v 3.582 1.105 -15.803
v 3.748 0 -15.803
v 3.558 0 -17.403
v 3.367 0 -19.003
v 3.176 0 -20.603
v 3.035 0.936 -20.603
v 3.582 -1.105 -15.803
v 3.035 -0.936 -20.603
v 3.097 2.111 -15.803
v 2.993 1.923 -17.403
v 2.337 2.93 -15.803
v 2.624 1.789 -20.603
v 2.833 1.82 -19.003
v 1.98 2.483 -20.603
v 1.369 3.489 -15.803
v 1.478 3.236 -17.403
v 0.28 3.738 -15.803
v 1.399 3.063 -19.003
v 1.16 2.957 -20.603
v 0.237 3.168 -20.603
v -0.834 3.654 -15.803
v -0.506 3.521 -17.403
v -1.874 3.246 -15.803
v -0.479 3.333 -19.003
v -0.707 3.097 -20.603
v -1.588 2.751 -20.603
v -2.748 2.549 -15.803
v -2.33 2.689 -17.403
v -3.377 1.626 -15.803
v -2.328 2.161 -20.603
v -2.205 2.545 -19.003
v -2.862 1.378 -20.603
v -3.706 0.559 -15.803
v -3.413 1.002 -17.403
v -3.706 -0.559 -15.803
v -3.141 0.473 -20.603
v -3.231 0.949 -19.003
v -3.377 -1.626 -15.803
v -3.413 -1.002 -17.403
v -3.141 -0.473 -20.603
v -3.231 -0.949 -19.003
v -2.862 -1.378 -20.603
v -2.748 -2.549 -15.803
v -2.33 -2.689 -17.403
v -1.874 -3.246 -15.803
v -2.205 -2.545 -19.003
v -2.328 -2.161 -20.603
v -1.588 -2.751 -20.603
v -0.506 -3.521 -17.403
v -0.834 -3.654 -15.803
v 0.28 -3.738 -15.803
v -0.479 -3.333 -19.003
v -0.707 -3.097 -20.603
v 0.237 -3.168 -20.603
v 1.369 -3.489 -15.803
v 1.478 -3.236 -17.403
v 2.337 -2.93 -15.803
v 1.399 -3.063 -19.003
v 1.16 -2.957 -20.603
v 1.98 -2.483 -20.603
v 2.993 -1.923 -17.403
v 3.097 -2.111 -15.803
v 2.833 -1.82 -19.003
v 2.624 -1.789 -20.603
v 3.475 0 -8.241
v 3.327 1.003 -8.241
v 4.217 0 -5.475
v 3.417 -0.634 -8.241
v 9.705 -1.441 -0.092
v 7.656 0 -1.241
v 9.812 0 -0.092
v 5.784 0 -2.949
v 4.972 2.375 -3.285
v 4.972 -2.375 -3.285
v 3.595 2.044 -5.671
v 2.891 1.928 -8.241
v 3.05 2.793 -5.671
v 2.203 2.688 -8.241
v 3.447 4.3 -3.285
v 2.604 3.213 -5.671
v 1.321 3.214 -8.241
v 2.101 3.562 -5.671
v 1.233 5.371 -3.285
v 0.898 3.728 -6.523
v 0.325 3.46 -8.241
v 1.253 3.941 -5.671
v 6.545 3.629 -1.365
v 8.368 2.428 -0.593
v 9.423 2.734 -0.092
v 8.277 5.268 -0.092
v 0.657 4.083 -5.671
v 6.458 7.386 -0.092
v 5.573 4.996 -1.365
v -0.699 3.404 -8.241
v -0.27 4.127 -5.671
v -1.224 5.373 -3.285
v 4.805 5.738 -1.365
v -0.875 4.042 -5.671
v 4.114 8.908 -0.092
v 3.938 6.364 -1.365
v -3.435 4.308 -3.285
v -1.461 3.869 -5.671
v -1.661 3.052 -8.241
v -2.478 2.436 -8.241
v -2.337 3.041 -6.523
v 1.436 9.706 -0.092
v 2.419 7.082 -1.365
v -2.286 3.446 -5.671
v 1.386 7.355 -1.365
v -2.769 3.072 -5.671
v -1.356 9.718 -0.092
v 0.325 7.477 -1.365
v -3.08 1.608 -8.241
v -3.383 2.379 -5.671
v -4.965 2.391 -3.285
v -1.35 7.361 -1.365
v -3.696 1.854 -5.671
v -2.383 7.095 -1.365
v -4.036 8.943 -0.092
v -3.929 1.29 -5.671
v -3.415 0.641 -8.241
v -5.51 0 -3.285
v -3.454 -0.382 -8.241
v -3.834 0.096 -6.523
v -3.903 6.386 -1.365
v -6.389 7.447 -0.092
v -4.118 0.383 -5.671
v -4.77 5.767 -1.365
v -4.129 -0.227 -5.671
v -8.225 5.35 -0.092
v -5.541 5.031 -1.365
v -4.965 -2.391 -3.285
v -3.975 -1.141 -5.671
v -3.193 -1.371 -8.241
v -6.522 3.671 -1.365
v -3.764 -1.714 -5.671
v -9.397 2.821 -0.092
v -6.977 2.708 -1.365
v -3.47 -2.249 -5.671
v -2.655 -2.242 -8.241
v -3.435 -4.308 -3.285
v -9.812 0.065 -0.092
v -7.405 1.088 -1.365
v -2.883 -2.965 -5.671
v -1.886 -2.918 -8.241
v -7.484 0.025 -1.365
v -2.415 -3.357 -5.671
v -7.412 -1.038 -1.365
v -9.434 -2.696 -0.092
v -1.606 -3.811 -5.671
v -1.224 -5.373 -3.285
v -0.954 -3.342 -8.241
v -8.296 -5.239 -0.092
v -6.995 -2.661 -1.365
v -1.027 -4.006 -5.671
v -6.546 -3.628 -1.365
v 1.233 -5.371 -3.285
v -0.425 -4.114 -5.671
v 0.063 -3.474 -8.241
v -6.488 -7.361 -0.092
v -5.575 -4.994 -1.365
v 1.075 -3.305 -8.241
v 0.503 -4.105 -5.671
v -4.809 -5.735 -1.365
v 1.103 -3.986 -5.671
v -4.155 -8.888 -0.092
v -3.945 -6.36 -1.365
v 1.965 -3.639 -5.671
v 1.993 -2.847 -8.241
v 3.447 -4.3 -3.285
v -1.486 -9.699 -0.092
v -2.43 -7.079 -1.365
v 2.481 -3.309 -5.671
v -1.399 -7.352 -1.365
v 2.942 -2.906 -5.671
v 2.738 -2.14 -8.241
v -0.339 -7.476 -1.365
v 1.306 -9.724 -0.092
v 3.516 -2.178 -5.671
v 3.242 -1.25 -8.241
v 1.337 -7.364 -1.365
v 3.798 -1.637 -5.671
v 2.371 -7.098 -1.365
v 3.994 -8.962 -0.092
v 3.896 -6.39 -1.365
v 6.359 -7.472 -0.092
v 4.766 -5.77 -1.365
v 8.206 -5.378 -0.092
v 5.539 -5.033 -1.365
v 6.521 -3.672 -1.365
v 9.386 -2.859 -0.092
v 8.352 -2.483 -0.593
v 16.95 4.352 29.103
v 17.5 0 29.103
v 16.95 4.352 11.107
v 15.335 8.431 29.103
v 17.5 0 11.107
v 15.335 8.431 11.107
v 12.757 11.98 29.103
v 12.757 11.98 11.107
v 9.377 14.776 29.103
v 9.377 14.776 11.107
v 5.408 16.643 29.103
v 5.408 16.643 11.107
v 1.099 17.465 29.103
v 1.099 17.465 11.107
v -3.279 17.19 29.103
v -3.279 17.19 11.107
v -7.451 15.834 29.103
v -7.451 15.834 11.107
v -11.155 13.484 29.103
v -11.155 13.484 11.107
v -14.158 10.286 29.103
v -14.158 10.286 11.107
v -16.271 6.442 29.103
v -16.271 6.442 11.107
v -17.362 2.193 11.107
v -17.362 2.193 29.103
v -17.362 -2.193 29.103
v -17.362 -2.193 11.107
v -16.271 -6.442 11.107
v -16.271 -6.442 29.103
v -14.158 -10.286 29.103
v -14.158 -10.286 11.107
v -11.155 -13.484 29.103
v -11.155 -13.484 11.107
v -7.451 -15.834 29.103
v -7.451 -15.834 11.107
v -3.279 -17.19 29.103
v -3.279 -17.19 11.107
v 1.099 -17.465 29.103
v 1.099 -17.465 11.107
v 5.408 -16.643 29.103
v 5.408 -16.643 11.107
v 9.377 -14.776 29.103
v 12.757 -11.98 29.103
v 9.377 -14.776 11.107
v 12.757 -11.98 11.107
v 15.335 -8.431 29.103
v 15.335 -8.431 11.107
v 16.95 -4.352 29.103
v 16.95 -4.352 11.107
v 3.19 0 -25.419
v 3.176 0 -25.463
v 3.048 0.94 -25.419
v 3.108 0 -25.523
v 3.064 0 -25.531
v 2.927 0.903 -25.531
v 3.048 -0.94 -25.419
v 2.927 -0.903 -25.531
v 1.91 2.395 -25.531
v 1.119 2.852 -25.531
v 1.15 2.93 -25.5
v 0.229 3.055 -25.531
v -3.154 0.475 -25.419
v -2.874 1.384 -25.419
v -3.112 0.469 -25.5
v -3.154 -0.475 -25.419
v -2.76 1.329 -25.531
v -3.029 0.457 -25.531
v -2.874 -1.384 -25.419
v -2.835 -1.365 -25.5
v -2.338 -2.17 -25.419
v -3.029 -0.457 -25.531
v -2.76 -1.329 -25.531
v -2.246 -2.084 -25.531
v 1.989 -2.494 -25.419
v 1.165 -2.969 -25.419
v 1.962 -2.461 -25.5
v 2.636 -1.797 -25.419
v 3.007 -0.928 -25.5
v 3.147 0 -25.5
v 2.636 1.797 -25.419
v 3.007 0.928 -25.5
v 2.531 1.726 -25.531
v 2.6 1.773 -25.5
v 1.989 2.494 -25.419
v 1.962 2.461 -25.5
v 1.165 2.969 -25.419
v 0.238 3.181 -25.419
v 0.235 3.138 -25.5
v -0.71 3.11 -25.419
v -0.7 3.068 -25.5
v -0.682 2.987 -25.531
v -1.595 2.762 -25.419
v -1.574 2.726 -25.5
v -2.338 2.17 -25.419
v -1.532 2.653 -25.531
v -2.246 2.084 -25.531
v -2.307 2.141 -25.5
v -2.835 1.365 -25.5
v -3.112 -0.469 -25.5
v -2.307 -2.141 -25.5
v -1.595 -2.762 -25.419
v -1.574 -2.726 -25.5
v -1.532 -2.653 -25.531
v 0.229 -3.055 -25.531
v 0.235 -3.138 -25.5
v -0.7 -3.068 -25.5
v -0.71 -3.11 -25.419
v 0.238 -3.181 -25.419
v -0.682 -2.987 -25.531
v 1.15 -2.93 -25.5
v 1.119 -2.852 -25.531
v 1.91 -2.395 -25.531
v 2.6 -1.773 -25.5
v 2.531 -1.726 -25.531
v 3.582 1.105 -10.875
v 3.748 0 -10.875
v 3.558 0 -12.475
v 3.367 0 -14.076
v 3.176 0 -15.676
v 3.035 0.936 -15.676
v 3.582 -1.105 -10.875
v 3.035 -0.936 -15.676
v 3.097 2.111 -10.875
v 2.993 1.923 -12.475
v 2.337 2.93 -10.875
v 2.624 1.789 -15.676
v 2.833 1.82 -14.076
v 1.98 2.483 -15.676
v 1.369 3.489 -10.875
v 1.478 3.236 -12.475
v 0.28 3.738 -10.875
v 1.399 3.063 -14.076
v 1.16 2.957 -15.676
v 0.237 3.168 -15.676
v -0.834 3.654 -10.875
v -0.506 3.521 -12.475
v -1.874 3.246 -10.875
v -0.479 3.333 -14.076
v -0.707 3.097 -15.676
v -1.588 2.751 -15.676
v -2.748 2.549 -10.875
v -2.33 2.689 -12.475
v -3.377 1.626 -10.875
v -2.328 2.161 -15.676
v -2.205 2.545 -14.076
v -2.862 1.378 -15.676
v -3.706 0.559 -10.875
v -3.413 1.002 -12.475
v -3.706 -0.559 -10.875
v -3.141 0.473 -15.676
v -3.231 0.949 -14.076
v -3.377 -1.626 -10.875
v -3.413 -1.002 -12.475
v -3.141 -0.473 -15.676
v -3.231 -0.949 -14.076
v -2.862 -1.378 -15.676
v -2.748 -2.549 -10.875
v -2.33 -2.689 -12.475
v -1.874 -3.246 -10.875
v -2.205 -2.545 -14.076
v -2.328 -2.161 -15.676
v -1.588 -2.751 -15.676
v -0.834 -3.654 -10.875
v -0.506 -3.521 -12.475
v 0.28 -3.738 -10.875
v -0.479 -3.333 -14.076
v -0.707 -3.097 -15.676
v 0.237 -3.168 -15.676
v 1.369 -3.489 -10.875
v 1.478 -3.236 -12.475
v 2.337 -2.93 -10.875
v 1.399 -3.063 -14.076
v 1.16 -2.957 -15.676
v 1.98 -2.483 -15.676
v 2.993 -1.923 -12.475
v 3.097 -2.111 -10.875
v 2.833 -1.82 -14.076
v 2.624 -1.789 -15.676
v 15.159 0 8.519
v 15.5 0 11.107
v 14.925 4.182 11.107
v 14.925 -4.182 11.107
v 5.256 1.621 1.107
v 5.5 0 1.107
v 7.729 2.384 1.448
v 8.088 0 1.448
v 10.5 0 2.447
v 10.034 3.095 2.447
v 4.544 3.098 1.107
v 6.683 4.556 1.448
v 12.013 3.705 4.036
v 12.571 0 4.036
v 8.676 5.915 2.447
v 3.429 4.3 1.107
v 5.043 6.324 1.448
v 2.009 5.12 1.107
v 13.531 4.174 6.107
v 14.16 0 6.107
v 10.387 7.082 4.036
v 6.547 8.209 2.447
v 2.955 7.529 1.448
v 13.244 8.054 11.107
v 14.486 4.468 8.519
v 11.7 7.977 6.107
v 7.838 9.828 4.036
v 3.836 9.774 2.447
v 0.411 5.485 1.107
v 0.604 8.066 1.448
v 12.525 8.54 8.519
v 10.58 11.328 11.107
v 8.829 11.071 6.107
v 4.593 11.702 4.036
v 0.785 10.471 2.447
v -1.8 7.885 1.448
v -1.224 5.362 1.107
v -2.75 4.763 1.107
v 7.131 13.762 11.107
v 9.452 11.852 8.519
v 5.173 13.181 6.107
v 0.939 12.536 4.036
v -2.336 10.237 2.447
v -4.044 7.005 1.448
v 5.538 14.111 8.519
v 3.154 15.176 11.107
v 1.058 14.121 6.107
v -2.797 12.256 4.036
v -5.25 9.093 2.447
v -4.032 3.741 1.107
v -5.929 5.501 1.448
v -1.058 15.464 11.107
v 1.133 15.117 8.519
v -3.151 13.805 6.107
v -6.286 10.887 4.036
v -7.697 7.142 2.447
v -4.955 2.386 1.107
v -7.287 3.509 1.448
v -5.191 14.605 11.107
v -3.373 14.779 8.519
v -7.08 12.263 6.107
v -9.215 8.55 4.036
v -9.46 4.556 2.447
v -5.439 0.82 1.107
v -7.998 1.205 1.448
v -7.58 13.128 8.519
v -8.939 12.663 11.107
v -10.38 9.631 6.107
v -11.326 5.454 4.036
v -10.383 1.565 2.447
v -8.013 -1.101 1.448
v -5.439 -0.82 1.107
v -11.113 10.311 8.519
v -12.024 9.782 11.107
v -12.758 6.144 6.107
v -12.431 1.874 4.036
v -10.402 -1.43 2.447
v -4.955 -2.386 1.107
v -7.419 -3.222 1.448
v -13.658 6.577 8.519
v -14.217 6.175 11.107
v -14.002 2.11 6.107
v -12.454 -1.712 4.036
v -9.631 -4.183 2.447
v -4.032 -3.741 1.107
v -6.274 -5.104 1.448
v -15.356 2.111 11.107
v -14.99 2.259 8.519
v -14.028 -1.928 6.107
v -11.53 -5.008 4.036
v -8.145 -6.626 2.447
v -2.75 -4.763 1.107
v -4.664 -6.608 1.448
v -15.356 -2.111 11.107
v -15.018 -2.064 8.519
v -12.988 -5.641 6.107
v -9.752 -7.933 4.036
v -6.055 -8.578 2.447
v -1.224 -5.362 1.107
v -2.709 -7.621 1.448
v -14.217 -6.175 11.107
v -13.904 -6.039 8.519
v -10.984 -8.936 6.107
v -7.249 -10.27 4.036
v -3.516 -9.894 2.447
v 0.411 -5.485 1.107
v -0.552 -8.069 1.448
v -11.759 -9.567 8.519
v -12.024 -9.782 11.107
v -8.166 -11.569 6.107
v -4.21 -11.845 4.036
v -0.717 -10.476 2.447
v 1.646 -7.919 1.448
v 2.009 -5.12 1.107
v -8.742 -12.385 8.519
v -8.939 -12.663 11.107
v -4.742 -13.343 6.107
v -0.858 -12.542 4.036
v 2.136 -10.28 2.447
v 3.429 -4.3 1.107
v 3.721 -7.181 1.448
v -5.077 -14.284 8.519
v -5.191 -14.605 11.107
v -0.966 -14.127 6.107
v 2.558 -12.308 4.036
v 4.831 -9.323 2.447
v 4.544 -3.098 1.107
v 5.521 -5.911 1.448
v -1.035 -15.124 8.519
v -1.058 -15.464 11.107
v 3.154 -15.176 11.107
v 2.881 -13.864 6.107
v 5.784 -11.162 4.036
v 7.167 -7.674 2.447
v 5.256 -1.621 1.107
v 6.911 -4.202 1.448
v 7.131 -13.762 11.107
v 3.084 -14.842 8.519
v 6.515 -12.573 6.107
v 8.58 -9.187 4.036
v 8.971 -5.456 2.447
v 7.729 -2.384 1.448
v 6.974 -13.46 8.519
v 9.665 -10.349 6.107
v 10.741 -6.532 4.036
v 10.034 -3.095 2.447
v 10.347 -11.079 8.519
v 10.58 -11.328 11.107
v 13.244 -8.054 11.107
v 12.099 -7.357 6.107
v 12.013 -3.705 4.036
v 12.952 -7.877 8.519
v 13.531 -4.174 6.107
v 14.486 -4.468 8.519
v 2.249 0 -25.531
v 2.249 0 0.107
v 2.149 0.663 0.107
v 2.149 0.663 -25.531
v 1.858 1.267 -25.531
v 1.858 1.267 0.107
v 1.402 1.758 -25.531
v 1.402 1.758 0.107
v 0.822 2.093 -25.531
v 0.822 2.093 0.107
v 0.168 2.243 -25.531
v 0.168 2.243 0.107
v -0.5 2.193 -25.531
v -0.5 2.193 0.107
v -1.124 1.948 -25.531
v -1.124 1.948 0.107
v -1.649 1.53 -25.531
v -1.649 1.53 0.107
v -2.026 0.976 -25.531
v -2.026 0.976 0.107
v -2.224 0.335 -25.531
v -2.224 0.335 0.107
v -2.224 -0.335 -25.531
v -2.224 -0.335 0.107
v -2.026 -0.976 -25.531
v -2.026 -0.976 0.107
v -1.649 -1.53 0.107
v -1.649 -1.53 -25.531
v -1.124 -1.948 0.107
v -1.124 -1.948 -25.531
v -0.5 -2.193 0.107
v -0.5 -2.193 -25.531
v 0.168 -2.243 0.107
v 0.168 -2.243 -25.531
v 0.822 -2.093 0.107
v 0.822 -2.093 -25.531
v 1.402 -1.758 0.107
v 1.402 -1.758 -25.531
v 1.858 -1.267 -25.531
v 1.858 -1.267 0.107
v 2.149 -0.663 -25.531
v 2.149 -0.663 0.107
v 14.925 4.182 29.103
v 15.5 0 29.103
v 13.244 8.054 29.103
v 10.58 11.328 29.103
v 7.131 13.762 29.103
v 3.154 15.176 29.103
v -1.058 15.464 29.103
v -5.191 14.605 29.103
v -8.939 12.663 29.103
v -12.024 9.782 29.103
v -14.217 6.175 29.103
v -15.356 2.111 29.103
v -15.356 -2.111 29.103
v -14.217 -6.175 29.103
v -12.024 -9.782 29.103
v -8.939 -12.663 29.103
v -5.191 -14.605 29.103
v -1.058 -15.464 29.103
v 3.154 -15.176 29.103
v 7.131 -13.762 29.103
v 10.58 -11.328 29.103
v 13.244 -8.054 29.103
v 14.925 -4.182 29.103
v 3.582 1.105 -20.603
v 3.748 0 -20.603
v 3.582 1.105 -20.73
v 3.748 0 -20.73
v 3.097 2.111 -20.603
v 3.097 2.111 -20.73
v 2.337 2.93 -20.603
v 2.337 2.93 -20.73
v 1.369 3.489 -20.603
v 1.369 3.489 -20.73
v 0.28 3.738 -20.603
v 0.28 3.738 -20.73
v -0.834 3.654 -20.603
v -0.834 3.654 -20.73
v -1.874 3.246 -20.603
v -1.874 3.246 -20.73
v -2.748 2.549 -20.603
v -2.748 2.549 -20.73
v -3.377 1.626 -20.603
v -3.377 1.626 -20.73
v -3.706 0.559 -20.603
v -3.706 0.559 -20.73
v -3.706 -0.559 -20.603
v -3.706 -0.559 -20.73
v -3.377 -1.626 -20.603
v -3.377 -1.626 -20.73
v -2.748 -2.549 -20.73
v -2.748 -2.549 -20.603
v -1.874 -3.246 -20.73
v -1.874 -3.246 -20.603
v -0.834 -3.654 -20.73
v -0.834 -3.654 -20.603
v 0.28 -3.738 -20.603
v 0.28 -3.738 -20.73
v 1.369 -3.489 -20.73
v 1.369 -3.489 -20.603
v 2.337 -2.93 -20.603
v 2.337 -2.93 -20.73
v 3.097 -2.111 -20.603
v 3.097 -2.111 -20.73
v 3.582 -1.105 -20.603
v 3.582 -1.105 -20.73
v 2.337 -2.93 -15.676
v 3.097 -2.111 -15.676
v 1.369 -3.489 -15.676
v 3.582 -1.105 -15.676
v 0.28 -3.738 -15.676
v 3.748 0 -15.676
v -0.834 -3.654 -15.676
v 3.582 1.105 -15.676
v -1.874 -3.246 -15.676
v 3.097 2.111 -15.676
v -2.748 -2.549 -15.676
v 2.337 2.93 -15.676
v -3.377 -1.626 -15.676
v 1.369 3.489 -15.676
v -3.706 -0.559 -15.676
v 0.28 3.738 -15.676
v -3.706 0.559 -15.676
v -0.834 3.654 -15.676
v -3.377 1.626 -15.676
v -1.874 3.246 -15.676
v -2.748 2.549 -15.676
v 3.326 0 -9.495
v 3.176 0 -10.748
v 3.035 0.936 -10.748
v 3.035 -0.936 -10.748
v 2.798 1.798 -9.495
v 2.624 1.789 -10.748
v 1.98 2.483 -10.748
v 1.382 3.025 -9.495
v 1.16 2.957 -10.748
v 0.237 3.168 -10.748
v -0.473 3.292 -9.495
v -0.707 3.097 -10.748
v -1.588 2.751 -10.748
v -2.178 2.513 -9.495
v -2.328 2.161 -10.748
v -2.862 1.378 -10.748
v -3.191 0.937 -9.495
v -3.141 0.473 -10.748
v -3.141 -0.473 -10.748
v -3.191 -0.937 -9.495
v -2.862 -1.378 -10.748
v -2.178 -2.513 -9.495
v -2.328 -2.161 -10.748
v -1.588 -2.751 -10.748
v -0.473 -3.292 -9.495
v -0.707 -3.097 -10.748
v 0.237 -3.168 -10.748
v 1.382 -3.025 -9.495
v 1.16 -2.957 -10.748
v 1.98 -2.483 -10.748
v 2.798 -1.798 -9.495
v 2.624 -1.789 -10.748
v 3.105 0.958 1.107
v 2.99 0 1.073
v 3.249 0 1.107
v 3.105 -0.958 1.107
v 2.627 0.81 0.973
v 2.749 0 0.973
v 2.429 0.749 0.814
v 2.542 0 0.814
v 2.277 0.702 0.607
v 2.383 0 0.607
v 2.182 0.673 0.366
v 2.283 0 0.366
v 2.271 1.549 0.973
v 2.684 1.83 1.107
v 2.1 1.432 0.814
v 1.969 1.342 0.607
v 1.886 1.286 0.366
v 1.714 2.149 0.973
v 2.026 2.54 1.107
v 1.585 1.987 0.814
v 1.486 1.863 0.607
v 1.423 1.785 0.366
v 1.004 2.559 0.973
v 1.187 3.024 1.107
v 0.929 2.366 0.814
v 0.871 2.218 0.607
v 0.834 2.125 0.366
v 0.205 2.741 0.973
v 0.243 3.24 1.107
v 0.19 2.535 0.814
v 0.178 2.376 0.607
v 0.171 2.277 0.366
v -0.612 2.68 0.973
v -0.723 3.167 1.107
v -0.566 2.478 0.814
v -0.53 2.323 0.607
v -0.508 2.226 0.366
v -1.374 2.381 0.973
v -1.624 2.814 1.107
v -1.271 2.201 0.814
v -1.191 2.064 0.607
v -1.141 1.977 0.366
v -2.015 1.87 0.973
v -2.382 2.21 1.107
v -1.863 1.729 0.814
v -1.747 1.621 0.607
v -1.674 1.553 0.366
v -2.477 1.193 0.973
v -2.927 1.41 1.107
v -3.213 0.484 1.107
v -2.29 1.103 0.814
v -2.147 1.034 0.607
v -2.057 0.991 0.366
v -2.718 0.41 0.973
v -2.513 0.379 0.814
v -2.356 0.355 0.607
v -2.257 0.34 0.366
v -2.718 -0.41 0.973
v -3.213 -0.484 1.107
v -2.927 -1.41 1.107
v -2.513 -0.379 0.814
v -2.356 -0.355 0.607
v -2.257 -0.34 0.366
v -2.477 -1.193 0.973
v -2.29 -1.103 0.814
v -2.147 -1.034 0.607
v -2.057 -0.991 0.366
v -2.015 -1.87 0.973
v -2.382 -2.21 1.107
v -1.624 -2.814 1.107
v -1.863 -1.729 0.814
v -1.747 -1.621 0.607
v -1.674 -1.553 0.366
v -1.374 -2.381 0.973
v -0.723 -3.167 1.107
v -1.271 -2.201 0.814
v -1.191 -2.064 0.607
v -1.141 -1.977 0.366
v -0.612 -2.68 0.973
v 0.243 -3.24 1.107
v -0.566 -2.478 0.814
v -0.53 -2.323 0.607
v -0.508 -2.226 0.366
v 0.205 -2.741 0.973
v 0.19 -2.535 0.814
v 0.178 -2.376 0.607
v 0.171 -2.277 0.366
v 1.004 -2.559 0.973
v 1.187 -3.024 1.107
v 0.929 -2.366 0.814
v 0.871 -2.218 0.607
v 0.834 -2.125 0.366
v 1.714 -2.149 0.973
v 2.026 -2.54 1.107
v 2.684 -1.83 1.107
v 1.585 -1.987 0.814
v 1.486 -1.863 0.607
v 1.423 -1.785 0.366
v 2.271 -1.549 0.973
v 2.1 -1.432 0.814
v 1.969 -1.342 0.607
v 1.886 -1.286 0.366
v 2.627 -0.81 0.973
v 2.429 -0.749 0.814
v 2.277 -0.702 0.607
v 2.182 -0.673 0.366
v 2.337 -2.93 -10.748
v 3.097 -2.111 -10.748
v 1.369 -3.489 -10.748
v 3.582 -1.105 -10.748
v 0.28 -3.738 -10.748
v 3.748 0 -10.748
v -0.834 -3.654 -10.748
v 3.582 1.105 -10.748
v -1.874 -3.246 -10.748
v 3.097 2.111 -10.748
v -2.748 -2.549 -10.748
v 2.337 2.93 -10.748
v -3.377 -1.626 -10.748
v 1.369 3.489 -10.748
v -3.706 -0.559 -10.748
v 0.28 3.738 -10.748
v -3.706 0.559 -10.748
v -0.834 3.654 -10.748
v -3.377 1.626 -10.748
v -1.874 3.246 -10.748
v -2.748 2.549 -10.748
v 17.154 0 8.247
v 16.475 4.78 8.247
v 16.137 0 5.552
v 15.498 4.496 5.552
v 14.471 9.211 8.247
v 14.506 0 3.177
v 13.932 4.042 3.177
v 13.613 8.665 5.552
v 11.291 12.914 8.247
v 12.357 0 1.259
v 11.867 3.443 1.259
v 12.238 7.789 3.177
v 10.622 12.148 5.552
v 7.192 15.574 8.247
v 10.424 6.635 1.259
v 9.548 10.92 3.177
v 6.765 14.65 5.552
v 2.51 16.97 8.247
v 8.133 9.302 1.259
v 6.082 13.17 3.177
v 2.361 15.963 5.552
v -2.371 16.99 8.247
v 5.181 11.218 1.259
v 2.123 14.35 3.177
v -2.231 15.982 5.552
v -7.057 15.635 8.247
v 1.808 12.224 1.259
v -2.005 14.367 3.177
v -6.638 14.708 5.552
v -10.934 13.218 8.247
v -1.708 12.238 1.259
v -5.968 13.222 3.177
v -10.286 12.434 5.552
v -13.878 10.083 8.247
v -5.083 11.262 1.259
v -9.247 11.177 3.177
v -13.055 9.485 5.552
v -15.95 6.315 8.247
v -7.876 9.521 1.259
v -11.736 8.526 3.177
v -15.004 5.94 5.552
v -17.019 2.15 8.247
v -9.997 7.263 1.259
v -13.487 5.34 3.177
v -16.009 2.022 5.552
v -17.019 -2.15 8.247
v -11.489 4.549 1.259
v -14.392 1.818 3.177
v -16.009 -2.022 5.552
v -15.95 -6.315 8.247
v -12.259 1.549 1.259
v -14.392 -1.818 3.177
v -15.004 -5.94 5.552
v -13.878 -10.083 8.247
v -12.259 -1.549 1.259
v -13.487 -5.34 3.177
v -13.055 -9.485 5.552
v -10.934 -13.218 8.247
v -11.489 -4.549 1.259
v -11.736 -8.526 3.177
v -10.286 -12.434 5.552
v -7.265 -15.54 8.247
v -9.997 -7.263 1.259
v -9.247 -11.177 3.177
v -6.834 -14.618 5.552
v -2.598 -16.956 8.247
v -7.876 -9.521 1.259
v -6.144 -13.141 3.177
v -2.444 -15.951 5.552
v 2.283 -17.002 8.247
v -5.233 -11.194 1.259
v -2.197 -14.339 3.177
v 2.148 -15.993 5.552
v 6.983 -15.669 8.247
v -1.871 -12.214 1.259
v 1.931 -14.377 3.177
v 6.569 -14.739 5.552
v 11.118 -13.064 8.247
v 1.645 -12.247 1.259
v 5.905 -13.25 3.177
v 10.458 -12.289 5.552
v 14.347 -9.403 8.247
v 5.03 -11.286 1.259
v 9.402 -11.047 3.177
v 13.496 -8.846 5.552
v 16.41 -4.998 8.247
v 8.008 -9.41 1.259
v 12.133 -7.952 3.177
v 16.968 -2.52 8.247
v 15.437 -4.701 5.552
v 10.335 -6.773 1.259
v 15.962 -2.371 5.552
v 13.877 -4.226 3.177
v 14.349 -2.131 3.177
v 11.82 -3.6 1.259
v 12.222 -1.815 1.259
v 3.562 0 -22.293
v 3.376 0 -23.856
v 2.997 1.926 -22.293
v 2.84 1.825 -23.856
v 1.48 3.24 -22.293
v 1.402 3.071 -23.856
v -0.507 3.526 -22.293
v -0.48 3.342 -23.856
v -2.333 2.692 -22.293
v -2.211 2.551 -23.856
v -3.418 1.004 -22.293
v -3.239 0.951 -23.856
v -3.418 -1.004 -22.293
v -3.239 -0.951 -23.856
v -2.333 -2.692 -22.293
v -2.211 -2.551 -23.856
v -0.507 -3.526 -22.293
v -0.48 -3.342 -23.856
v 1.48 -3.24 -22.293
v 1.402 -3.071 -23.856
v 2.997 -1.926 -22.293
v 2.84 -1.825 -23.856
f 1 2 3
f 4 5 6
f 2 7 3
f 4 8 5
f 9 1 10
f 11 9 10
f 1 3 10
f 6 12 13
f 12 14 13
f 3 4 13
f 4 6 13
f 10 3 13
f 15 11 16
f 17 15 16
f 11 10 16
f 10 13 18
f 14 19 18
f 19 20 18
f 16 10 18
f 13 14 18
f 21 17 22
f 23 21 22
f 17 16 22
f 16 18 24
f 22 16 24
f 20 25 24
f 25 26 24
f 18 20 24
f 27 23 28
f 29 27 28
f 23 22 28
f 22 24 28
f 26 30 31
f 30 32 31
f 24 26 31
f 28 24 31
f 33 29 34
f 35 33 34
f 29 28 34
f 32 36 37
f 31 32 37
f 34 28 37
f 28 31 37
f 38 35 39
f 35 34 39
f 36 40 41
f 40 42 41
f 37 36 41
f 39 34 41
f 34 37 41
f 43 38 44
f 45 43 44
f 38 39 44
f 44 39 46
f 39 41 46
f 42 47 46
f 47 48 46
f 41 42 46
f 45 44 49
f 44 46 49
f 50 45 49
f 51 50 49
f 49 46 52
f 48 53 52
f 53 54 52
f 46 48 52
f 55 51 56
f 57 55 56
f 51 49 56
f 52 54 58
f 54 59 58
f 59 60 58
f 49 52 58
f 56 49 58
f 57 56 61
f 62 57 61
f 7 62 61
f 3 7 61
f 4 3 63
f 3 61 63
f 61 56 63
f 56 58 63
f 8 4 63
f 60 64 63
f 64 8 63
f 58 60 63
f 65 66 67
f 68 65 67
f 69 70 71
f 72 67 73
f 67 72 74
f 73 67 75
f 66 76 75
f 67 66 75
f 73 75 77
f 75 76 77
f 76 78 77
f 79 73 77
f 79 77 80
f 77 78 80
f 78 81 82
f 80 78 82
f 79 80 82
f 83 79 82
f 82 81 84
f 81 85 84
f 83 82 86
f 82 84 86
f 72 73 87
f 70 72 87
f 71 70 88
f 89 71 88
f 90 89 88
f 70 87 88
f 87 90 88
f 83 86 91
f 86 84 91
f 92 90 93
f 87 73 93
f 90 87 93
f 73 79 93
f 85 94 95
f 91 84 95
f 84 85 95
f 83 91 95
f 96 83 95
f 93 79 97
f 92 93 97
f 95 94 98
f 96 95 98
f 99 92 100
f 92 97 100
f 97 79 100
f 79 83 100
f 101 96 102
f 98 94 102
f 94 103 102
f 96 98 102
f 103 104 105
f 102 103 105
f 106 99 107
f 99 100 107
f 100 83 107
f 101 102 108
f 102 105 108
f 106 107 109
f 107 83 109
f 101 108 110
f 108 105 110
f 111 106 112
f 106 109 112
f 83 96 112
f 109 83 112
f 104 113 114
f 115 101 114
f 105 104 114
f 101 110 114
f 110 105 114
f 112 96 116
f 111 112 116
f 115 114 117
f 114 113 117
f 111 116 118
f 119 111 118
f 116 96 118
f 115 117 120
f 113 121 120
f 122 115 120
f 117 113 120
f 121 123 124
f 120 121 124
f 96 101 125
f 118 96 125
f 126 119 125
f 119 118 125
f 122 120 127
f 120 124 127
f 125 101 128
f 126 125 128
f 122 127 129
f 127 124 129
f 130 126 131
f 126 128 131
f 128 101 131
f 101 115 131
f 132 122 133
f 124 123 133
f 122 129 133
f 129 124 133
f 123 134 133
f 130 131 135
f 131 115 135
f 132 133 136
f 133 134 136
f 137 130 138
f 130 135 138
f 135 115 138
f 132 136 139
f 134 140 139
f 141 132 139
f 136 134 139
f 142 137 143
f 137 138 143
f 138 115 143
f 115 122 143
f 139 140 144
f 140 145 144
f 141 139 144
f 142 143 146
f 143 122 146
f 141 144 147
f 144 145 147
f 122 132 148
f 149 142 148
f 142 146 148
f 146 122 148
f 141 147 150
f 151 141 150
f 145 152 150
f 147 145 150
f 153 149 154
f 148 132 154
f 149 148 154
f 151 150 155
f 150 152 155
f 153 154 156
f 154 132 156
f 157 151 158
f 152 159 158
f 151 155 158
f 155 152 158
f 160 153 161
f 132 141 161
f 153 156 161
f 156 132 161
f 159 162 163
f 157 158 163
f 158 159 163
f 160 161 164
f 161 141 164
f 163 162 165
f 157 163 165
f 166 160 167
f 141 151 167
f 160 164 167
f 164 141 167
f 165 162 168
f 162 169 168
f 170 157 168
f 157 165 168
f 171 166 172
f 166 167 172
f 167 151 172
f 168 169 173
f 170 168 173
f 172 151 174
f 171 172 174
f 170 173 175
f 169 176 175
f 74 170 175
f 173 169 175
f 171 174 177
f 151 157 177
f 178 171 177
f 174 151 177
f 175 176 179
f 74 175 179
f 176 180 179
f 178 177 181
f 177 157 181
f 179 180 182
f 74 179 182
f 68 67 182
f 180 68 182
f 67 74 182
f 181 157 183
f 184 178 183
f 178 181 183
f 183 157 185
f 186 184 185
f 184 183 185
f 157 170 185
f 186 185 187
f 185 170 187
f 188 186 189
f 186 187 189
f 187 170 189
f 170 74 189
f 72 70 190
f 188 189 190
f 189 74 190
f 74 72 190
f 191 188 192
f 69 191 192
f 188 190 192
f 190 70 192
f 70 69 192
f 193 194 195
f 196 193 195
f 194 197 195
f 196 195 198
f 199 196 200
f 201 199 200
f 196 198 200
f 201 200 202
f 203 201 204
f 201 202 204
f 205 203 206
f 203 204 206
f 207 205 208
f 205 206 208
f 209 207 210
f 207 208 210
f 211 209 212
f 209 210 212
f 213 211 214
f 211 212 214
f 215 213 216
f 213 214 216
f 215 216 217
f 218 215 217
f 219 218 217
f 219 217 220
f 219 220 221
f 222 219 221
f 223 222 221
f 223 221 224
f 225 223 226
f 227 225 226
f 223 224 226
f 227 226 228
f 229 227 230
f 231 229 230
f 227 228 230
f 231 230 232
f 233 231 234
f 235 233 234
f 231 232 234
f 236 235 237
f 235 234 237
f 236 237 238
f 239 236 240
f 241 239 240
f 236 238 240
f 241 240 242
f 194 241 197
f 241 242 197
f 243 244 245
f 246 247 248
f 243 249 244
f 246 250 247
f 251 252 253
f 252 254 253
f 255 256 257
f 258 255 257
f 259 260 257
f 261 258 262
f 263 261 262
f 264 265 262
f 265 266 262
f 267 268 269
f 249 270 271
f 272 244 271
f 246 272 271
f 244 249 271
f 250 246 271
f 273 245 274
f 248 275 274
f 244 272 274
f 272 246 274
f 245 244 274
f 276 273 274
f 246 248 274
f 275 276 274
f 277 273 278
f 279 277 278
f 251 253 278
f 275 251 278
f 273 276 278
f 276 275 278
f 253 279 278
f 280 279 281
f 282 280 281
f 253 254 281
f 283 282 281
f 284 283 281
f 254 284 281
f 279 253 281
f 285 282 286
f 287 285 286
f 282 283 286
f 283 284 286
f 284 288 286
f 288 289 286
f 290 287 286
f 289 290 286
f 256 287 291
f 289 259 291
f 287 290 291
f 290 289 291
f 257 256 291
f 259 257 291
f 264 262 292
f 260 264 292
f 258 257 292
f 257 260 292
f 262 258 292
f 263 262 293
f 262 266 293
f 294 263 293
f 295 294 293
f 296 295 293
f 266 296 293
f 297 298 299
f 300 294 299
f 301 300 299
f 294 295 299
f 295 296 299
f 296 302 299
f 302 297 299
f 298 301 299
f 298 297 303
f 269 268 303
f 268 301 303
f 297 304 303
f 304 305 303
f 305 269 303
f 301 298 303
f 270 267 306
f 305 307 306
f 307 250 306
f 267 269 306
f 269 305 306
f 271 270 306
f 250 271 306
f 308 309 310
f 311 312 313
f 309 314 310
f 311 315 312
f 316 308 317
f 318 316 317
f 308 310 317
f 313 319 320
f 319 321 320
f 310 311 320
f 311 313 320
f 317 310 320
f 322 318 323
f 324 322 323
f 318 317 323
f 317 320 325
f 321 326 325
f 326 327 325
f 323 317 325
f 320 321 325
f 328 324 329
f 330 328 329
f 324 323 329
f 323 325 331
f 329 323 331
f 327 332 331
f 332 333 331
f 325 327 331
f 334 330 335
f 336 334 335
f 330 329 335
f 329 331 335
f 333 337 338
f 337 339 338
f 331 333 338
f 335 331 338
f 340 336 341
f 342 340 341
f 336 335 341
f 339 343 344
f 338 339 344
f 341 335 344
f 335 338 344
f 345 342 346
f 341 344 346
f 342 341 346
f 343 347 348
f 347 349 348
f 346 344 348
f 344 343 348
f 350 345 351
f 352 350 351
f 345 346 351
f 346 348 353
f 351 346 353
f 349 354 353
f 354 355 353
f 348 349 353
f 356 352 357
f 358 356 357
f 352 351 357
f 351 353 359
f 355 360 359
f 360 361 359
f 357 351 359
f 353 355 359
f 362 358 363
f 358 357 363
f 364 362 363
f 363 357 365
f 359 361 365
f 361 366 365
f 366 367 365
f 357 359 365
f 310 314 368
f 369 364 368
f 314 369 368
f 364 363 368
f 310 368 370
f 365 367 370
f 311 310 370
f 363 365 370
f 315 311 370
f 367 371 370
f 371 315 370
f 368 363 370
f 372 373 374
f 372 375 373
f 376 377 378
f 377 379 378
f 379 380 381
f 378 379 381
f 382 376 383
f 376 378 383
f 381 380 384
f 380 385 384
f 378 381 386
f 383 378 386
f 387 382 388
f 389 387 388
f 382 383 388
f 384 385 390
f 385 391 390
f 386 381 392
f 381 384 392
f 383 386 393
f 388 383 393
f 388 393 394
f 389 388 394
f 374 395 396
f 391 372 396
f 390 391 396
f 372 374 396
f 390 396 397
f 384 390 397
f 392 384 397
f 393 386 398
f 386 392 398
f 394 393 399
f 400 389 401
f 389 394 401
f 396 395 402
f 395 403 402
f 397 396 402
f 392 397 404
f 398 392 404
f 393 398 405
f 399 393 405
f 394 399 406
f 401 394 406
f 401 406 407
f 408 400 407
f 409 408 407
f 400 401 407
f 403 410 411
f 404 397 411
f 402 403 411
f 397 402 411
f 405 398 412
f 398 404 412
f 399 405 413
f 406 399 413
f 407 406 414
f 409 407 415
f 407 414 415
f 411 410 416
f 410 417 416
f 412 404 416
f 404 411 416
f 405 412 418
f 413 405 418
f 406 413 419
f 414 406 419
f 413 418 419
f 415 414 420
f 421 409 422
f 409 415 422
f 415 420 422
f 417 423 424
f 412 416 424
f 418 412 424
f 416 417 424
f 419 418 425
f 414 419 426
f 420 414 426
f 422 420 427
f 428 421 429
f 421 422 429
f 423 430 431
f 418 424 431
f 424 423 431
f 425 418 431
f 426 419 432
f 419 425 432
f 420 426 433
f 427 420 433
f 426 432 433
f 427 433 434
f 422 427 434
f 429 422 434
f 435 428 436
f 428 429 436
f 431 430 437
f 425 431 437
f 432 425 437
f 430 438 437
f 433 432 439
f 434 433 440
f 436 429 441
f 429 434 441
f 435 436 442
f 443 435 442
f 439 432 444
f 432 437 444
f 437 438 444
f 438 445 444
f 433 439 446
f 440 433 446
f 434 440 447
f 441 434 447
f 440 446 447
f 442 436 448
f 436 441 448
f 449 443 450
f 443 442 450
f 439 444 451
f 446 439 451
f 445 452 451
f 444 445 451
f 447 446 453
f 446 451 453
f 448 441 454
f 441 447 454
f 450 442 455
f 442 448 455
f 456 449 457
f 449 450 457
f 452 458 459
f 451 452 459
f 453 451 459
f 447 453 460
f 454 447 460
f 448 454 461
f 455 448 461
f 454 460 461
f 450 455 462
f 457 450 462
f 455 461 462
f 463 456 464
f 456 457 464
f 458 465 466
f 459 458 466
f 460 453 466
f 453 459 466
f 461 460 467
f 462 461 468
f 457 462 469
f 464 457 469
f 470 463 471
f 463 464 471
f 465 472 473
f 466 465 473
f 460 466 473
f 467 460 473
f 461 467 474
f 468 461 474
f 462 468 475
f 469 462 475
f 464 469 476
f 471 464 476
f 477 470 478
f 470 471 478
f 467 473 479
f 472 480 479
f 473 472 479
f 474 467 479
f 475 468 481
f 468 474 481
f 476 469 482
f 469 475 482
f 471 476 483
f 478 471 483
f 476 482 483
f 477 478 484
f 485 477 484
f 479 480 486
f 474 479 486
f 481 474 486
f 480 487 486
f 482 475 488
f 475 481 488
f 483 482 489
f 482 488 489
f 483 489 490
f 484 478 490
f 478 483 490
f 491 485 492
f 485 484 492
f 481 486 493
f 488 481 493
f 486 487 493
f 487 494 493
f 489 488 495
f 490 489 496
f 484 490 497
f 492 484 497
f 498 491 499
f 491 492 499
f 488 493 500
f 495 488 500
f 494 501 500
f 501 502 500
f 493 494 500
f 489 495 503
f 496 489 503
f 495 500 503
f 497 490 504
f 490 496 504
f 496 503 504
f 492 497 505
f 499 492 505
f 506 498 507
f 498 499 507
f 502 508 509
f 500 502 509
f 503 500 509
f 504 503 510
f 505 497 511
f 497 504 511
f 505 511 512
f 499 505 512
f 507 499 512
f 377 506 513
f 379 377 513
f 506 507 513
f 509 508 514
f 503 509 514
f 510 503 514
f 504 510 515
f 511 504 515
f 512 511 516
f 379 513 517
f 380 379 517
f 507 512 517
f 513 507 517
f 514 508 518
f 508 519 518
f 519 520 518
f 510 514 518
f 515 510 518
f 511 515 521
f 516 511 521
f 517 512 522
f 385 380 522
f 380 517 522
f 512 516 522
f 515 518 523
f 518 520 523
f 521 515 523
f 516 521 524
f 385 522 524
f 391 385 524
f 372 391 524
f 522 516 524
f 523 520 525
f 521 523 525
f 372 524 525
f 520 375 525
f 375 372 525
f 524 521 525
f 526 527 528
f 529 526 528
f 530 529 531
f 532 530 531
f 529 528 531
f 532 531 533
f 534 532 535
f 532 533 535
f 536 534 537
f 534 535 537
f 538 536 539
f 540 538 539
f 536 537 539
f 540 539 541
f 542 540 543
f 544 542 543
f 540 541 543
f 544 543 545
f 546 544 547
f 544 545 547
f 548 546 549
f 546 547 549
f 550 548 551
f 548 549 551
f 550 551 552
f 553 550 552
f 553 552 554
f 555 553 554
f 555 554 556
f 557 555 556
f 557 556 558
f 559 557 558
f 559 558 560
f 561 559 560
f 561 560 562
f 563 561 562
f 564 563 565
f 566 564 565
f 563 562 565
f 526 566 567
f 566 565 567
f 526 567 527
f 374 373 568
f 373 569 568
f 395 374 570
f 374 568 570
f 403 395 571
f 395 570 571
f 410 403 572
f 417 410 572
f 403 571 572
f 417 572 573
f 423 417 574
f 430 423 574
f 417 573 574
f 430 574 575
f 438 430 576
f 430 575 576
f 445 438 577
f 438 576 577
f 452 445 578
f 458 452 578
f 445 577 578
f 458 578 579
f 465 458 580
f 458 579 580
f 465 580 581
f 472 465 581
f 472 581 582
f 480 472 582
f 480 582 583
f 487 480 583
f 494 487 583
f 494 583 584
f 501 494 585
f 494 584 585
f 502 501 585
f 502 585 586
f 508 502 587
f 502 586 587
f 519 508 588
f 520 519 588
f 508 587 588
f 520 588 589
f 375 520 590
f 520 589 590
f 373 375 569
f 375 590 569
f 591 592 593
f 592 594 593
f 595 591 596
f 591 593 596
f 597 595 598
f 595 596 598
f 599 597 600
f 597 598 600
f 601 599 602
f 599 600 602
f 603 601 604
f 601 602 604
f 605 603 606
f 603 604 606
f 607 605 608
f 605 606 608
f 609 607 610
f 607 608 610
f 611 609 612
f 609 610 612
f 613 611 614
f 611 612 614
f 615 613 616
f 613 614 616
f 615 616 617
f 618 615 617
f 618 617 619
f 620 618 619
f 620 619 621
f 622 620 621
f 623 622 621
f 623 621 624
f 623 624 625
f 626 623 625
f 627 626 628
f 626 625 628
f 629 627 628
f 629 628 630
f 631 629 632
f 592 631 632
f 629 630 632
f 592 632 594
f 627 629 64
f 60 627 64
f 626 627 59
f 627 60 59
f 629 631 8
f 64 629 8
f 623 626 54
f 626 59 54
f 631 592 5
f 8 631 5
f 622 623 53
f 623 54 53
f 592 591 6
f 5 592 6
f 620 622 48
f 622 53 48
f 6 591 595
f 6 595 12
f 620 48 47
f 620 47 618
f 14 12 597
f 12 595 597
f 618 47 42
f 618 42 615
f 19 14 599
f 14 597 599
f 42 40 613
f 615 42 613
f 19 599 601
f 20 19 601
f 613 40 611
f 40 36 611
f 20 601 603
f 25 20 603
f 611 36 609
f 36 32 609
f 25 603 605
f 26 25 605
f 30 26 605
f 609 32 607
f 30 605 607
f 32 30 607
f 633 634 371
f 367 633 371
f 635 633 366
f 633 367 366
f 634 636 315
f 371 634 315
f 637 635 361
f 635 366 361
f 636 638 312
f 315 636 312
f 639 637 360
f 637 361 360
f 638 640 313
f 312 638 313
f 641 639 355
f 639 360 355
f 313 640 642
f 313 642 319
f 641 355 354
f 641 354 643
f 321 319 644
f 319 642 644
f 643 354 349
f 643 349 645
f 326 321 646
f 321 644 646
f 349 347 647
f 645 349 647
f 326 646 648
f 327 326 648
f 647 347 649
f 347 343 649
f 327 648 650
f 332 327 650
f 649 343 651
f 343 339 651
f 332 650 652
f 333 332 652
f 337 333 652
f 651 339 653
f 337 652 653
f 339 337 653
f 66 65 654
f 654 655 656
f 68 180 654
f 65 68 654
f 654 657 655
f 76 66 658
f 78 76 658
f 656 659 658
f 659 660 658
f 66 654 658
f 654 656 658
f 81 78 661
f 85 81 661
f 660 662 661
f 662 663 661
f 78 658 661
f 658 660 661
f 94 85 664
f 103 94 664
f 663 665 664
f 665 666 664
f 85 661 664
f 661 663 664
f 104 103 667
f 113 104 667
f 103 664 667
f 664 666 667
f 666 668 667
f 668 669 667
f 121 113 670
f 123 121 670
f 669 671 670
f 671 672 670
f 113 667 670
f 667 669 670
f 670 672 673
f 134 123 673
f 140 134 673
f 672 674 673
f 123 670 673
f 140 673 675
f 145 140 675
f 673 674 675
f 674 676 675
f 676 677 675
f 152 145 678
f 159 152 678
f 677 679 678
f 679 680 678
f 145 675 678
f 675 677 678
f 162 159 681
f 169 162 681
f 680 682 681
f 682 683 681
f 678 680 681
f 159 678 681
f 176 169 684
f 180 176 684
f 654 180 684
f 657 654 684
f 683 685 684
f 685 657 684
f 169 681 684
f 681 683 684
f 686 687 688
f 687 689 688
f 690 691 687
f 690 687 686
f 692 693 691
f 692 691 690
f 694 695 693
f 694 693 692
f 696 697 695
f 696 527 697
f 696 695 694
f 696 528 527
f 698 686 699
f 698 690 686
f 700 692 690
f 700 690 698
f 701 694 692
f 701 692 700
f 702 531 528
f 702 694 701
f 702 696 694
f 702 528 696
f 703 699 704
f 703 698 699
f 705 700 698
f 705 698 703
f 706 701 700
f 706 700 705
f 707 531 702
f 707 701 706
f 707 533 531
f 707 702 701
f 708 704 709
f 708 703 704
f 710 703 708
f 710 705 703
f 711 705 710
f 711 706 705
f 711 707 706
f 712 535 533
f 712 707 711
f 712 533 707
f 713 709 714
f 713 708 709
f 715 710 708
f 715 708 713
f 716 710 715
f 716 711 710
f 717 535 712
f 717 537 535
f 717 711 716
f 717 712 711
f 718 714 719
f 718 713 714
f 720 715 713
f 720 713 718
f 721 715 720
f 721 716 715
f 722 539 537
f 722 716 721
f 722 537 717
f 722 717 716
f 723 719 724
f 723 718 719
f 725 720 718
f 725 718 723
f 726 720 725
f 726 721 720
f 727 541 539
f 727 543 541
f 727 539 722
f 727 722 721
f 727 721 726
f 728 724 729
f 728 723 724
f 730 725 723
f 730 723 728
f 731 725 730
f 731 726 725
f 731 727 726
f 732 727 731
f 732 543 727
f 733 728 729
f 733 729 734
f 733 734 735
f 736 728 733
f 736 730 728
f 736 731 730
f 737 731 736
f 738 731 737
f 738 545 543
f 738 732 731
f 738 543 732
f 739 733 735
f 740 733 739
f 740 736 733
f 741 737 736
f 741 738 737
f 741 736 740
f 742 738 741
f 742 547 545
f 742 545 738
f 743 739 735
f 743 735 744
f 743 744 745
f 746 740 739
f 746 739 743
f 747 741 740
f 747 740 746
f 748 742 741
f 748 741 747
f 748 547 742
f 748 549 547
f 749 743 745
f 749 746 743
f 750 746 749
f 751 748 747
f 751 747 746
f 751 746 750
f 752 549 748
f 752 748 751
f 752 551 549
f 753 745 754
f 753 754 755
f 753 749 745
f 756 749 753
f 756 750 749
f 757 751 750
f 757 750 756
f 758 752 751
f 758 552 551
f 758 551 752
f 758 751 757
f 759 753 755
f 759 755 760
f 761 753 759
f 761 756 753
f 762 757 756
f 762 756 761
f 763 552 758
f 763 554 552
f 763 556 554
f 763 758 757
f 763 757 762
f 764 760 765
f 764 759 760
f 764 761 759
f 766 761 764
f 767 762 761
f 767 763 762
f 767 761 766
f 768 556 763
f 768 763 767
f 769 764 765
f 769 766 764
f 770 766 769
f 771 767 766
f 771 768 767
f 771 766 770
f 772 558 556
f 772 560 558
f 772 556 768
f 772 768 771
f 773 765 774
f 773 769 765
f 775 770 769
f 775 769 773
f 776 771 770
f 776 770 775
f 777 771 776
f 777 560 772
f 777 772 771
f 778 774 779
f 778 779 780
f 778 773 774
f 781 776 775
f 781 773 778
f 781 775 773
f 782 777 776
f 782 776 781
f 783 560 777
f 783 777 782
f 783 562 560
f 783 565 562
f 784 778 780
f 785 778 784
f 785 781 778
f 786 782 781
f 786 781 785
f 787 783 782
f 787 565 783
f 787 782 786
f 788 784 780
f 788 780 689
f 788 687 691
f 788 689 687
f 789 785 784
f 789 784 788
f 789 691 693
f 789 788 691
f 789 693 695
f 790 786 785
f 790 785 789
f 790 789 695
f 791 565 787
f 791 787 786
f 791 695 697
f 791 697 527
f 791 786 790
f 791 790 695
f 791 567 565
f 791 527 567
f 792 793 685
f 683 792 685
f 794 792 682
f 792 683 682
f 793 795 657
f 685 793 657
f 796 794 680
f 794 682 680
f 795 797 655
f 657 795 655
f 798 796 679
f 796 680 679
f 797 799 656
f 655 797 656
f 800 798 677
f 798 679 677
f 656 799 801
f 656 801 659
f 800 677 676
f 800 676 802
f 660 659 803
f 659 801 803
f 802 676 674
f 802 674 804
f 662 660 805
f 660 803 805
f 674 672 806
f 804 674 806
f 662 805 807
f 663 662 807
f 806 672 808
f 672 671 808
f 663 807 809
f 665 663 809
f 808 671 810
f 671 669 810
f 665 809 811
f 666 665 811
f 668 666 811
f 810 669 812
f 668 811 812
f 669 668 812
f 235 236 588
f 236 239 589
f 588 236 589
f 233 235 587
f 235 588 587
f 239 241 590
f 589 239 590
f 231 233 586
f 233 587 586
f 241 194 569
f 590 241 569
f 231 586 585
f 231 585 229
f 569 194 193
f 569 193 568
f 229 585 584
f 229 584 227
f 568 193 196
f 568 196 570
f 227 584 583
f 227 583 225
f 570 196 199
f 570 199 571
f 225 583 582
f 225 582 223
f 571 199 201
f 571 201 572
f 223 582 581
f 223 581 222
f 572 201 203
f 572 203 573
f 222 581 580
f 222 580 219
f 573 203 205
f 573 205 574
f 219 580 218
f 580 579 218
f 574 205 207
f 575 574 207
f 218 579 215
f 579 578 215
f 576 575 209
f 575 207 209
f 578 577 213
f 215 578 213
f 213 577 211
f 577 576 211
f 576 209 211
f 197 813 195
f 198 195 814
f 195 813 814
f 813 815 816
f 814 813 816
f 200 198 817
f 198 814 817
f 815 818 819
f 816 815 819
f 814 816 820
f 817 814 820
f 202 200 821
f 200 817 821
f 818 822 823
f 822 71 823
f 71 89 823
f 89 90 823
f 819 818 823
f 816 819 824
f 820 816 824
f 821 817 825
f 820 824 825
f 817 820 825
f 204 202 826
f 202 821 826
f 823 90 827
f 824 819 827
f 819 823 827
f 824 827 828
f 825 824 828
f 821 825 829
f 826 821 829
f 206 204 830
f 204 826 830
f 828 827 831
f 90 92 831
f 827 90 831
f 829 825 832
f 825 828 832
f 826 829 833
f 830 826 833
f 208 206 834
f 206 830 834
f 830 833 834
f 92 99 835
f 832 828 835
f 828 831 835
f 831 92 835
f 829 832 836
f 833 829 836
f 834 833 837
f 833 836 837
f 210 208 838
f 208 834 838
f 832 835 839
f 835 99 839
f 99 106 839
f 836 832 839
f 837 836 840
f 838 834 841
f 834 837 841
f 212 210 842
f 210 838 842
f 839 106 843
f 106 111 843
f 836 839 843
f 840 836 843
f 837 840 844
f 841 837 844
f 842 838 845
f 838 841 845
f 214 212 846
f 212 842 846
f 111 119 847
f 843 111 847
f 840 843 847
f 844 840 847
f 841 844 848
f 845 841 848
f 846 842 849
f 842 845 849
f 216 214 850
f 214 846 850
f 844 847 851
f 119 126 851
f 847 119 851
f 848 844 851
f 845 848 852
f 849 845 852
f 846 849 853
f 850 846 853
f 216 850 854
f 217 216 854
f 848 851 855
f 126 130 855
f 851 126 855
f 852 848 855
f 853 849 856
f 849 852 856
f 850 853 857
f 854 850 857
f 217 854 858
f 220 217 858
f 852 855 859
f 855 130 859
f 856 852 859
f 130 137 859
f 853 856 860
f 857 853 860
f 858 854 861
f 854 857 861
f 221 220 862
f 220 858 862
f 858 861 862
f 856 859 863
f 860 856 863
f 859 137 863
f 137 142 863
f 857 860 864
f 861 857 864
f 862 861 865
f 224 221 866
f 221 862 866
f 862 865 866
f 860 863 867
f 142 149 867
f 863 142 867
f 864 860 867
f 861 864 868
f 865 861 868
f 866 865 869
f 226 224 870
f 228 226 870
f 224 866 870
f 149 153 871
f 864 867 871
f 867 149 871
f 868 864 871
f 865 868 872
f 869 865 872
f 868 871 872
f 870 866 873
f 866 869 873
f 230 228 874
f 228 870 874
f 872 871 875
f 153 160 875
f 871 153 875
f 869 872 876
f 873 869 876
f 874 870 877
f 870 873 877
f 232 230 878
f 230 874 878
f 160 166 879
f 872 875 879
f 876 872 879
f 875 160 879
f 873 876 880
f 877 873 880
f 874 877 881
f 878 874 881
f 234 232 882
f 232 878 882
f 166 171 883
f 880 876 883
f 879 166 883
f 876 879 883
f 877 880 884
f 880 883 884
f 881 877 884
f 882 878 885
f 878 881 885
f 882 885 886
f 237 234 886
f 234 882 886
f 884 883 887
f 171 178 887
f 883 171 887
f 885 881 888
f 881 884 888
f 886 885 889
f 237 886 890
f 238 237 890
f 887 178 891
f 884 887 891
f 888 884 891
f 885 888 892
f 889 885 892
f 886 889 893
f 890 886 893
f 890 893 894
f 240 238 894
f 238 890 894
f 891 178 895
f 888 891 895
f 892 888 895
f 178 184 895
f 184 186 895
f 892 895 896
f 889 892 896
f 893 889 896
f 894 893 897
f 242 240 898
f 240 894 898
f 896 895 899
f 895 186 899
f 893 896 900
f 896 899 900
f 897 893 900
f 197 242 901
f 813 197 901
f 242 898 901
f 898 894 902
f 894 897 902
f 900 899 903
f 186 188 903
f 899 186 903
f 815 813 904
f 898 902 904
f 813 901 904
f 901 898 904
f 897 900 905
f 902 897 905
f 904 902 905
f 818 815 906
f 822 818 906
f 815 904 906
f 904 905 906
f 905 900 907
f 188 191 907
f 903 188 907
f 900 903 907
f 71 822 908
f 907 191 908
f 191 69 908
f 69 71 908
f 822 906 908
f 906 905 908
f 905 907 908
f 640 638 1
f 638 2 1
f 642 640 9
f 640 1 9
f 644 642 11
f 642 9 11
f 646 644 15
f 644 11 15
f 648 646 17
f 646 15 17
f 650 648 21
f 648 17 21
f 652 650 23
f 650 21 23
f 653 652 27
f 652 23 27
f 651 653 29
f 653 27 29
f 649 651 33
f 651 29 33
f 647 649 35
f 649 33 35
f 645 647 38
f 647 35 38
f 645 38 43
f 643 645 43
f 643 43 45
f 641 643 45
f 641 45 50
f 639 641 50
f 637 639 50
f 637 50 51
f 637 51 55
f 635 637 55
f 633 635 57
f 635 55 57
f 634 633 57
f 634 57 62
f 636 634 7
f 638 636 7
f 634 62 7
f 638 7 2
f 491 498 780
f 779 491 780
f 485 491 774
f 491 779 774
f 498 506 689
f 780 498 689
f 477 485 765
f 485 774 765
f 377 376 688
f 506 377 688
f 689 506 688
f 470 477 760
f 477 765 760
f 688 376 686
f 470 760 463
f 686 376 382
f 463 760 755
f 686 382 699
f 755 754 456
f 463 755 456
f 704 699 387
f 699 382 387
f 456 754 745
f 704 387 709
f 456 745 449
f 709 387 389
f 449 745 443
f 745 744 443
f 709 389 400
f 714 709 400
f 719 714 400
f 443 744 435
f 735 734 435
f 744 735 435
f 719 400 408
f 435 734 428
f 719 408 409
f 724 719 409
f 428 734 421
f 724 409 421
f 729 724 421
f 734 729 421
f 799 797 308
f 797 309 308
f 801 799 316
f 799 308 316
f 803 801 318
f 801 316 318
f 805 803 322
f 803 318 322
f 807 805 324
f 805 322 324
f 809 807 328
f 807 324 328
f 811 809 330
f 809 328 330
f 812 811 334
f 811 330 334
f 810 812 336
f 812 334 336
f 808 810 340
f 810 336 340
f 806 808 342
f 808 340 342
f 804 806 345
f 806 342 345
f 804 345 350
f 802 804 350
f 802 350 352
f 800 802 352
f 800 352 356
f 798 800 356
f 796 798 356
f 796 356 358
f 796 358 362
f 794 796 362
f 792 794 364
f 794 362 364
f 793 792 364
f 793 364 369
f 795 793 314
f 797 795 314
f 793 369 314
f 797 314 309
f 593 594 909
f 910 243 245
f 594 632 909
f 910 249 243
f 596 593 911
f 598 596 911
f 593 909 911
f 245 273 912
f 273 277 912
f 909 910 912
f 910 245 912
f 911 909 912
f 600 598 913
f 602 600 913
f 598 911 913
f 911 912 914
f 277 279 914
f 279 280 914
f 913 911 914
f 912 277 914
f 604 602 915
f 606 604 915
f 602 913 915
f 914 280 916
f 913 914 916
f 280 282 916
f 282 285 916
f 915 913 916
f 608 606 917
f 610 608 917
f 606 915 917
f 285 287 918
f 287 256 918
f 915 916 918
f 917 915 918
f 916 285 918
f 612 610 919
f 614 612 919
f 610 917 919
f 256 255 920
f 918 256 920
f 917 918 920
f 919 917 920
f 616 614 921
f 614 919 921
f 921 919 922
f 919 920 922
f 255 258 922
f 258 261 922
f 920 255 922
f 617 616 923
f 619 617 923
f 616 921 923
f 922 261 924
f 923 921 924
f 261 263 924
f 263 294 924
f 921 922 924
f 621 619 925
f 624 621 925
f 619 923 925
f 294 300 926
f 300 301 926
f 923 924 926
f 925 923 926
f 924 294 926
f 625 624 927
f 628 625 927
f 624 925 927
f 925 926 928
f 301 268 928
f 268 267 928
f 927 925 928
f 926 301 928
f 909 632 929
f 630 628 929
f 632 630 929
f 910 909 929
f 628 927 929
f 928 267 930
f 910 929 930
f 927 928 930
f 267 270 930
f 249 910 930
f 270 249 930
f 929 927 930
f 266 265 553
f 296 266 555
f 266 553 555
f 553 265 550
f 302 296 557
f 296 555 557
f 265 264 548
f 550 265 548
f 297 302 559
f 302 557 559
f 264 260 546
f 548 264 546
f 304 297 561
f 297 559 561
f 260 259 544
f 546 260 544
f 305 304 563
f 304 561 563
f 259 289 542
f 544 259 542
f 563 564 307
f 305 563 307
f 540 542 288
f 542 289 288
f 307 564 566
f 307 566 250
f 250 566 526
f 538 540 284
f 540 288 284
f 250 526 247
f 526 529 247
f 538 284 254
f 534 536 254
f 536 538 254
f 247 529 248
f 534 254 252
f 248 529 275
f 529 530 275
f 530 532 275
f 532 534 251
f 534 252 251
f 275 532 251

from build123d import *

# Parameters (mm, degrees)
FILLET1_R = 10
FILLET2_R = 1


with BuildPart() as part:
    # Sketch1 → Revolve1 (revolve)
    with BuildSketch(Plane(origin=(0, 0, 0), x_dir=(1, 0, 0), z_dir=(0, 1, 0))):
        with BuildLine():
            Line((4.350194802, 0.893), (3.17642875, 10.7482))
            Line((3.17642875, 10.7482), (3.748185925, 10.7482))
            Line((3.748185925, 10.7482), (3.748185925, 10.8752))
            Line((3.748185925, 10.8752), (3.17642875, 15.6758))
            Line((3.17642875, 15.6758), (3.748185925, 15.6758))
            Line((3.748185925, 15.6758), (3.748185925, 15.8028))
            Line((3.748185925, 15.8028), (3.17642875, 20.6034))
            Line((3.17642875, 20.6034), (3.748185925, 20.6034))
            Line((3.748185925, 20.6034), (3.748185925, 20.7304))
            Line((3.748185925, 20.7304), (3.189766531, 25.419013037))
            add(Edge.make_bspline(
                [(3.189766531, 25.419013037), (3.186366459, 25.447560793), (3.171391458, 25.478531163), (3.122909051, 25.520829006), (3.091096062, 25.531), (3.063600271, 25.531)],
                knots=[0, 0, 0, 0, 0.5, 0.5, 1, 1, 1, 1], degree=3))
            Line((3.063600271, 25.531), (2.248911555, 25.531))
            Line((2.248911555, 25.531), (2.248911555, -1.107))
            Line((2.248911555, -1.107), (5.5, -1.107))
            ThreePointArc((5.5, -1.107), (12.571067812, -4.035932188), (15.5, -11.107))
            Line((15.5, -11.107), (15.5, -29.102833044))
            Line((15.5, -29.102833044), (17.5, -29.102833044))
            Line((17.5, -29.102833044), (17.5, -11.107))
            ThreePointArc((17.5, -11.107), (13.985281374, -2.621718626), (5.5, 0.893))
            Line((5.5, 0.893), (4.350194802, 0.893))
        make_face()
    revolve(axis=Axis((0, 0, -25.781), (0, 0, 1)))

    # Fillet1
    fillet1_edges = [part.edges().sort_by_distance(p)[0] for p in [
        (-4.350194802, 0, -0.893),
    ]]
    fillet(fillet1_edges, radius=FILLET1_R)

    # Fillet2
    fillet2_edges = [part.edges().sort_by_distance(p)[0] for p in [
        (-2.248911555, 0, 1.107),
    ]]
    fillet(fillet2_edges, radius=FILLET2_R)


solid = part.part
